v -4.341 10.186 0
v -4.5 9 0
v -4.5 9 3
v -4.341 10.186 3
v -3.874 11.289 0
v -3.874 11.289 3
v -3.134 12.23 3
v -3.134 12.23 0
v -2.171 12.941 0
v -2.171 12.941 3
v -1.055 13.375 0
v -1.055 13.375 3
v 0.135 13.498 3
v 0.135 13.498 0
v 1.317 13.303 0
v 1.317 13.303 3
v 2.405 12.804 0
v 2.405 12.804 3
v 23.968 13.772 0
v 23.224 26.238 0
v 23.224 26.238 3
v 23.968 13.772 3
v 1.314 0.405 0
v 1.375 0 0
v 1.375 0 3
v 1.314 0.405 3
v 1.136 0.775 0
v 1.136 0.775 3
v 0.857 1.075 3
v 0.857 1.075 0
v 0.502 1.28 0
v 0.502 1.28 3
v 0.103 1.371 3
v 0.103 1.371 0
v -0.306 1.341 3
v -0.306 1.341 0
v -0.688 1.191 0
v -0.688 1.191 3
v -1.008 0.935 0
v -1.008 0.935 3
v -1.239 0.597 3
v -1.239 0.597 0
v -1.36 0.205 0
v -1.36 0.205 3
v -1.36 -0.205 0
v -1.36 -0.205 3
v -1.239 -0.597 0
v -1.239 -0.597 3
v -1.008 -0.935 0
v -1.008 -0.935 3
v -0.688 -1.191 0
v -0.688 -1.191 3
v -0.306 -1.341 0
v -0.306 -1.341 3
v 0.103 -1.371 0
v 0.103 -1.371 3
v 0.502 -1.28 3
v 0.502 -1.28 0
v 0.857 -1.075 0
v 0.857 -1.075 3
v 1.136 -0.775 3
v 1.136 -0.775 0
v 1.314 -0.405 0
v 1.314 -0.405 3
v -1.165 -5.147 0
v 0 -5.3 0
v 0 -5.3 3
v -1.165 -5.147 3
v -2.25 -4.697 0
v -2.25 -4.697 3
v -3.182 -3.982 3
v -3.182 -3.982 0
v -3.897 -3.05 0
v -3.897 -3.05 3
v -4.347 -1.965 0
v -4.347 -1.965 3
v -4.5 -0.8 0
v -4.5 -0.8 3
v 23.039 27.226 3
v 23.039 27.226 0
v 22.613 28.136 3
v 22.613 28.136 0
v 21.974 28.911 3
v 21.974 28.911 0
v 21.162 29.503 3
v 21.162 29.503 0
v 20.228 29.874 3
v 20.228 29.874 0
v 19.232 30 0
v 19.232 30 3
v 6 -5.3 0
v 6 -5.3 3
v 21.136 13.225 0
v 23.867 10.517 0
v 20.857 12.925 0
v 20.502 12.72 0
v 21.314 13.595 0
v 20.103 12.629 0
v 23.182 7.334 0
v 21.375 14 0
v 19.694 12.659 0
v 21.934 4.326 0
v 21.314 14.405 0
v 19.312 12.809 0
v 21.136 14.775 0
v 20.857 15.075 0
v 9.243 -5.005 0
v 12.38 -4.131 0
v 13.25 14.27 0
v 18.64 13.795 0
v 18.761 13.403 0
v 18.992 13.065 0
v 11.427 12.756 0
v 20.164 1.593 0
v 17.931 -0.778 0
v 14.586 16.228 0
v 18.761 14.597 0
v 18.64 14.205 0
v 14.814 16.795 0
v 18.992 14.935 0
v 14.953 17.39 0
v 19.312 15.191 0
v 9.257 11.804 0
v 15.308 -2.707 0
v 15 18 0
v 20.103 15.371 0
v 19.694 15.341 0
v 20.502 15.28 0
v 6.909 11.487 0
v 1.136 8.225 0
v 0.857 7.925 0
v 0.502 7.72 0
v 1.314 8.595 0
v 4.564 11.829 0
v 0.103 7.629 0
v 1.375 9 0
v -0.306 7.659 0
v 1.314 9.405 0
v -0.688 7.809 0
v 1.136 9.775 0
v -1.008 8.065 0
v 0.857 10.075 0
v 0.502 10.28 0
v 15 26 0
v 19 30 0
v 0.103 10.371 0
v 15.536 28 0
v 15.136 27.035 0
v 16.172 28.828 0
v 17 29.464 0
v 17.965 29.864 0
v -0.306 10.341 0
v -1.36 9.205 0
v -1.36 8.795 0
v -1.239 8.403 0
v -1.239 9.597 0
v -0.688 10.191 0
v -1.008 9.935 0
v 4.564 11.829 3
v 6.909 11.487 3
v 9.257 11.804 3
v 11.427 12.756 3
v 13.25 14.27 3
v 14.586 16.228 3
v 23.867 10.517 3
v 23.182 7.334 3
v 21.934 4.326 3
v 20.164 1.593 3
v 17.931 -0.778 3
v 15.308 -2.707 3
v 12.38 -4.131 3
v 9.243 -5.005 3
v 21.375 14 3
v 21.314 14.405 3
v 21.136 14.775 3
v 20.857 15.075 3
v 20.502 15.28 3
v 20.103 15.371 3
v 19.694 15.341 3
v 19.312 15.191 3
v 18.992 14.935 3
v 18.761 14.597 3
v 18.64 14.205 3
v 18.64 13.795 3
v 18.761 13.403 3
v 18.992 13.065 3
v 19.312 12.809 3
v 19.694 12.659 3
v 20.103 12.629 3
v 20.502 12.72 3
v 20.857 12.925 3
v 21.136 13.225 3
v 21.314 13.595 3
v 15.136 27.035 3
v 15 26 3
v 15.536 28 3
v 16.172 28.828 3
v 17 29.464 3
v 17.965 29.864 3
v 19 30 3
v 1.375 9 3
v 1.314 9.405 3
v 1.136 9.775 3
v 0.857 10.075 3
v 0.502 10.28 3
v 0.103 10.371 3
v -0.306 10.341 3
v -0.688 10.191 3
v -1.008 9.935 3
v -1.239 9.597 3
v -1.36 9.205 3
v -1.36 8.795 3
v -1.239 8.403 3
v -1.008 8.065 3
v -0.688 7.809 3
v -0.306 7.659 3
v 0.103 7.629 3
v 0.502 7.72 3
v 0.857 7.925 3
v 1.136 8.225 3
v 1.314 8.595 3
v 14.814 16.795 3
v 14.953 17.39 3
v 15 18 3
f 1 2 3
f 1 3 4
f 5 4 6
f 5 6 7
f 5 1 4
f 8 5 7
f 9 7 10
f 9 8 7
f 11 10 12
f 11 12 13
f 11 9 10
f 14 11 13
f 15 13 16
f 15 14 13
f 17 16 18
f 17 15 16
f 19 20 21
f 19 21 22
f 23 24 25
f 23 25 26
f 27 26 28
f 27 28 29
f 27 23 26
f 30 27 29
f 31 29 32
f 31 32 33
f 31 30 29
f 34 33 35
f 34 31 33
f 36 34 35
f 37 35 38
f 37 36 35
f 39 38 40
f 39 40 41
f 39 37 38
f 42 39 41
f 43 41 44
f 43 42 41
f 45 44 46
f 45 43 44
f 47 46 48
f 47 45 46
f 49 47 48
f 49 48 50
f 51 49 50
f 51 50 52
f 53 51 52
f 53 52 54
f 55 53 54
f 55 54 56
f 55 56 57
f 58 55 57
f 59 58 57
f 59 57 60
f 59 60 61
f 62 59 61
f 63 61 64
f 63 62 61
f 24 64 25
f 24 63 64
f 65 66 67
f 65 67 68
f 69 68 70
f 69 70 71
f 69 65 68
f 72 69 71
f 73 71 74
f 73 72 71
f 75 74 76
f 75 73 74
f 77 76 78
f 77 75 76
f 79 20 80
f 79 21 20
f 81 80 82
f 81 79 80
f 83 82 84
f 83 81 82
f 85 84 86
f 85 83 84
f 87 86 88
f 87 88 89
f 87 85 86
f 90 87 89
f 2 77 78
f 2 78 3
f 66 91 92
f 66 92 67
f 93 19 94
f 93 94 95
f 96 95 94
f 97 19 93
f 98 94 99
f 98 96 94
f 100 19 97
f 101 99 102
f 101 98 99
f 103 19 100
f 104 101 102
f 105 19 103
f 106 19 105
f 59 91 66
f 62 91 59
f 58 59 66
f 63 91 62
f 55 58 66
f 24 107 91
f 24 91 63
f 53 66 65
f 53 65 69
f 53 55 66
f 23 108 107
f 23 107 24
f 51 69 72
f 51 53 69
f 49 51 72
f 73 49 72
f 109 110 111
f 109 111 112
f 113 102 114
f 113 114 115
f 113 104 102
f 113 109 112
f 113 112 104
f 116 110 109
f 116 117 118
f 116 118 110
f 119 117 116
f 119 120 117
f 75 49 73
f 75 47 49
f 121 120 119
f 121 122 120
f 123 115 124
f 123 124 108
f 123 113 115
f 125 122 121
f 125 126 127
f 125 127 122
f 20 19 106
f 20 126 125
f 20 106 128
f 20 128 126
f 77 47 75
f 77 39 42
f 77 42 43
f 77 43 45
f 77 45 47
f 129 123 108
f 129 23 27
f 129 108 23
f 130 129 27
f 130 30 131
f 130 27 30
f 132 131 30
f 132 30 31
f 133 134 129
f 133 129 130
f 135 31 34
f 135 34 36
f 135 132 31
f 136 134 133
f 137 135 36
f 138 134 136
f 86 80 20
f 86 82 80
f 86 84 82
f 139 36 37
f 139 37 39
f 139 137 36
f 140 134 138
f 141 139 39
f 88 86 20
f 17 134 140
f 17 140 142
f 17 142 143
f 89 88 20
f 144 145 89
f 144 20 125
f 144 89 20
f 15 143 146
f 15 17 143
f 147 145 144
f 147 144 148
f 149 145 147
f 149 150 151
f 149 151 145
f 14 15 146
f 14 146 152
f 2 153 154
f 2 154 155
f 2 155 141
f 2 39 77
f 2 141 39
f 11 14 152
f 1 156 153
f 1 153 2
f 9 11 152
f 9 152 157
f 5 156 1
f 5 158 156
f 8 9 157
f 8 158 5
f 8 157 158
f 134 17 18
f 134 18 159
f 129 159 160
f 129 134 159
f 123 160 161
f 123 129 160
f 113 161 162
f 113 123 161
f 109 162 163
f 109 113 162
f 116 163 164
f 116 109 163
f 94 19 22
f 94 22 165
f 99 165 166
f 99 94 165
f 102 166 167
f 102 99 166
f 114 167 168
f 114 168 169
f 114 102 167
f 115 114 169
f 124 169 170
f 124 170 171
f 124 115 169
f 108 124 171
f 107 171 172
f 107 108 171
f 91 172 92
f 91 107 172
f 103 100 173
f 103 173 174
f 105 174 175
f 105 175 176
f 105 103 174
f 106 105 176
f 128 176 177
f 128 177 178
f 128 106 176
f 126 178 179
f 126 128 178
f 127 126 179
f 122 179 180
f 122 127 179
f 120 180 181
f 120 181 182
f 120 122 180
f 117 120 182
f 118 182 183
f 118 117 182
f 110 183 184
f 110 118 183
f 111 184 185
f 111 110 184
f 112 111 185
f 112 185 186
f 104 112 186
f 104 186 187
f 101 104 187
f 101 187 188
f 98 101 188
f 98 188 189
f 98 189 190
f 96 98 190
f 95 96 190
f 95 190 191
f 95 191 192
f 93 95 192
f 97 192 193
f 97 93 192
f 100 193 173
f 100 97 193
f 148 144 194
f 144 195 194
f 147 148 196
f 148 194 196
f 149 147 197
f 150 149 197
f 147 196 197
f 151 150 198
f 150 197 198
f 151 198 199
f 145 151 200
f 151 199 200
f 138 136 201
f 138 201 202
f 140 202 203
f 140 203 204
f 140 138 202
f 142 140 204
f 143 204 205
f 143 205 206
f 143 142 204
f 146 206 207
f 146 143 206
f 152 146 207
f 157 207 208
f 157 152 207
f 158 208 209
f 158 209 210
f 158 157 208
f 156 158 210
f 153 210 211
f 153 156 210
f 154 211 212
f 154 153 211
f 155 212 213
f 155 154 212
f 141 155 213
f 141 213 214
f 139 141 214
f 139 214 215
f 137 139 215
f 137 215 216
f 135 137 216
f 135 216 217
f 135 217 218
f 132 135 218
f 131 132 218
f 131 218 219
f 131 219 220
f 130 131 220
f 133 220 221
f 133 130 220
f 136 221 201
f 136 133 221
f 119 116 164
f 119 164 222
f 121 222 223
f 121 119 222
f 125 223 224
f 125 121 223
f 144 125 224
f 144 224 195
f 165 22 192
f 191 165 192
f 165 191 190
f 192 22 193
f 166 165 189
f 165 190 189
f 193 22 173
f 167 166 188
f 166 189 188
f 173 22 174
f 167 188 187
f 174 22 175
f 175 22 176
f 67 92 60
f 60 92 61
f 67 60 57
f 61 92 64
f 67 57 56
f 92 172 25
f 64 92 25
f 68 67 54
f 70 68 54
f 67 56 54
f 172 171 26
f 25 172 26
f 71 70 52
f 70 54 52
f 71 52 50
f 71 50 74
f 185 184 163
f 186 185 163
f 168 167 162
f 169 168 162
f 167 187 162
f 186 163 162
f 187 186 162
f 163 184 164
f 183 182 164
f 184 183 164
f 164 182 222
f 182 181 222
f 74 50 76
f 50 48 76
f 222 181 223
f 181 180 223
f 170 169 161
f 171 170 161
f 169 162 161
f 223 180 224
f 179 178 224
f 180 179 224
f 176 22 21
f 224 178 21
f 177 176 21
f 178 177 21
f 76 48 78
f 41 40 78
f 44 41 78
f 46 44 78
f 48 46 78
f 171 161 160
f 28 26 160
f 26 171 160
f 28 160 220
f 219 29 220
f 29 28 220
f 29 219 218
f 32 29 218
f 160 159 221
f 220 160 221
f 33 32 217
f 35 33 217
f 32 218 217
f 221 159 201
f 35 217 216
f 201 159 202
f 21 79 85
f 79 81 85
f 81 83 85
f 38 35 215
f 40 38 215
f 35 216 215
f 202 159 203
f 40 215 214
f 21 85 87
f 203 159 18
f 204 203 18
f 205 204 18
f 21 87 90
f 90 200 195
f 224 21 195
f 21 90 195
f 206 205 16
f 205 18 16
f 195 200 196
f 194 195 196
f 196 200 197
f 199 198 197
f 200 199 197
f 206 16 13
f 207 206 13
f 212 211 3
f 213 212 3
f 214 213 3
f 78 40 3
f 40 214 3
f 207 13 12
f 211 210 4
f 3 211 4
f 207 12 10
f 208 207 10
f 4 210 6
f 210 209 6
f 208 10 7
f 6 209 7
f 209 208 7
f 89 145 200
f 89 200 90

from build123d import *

# Parameters (mm, degrees)
SKETCH1_R           = 1.375
BOSS_EXTRUDE1_DEPTH = 3
FILLET1_R           = 4


with BuildPart() as part:
    # Sketch1 → Boss-Extrude1 (new body)
    with BuildSketch(Plane.XY):
        with BuildLine():
            Line((-4.5, -0.8), (-4.5, 9))
            ThreePointArc((-4.5, 9), (-2.171359962, 12.941471288), (2.404531518, 12.803712421))
            ThreePointArc((2.404531518, 12.803712421), (9.257380419, 11.803998346), (14.585878733, 16.227579703))
            ThreePointArc((14.585878733, 16.227579703), (14.895094025, 17.089921688), (15, 18))
            Line((15, 18), (15, 30))
            Line((15, 30), (23, 30))
            Line((23, 30), (23.968058833, 13.771849702))
            ThreePointArc((23.968058833, 13.771849702), (19.101398678, 0.356849969), (6, -5.3))
            Line((6, -5.3), (0, -5.3))
            ThreePointArc((0, -5.3), (-3.181980515, -3.981980515), (-4.5, -0.8))
        make_face()
        Circle(SKETCH1_R, mode=Mode.SUBTRACT)
        with Locations((0, 9)):
            Circle(SKETCH1_R, mode=Mode.SUBTRACT)
        with Locations((20, 14)):
            Circle(SKETCH1_R, mode=Mode.SUBTRACT)
    extrude(amount=BOSS_EXTRUDE1_DEPTH)

    # Fillet1
    fillet1_edges = [part.edges().sort_by_distance(p)[0] for p in [
        (15, 30, 1.5),
        (23, 30, 1.5),
    ]]
    fillet(fillet1_edges, radius=FILLET1_R)


solid = part.part
